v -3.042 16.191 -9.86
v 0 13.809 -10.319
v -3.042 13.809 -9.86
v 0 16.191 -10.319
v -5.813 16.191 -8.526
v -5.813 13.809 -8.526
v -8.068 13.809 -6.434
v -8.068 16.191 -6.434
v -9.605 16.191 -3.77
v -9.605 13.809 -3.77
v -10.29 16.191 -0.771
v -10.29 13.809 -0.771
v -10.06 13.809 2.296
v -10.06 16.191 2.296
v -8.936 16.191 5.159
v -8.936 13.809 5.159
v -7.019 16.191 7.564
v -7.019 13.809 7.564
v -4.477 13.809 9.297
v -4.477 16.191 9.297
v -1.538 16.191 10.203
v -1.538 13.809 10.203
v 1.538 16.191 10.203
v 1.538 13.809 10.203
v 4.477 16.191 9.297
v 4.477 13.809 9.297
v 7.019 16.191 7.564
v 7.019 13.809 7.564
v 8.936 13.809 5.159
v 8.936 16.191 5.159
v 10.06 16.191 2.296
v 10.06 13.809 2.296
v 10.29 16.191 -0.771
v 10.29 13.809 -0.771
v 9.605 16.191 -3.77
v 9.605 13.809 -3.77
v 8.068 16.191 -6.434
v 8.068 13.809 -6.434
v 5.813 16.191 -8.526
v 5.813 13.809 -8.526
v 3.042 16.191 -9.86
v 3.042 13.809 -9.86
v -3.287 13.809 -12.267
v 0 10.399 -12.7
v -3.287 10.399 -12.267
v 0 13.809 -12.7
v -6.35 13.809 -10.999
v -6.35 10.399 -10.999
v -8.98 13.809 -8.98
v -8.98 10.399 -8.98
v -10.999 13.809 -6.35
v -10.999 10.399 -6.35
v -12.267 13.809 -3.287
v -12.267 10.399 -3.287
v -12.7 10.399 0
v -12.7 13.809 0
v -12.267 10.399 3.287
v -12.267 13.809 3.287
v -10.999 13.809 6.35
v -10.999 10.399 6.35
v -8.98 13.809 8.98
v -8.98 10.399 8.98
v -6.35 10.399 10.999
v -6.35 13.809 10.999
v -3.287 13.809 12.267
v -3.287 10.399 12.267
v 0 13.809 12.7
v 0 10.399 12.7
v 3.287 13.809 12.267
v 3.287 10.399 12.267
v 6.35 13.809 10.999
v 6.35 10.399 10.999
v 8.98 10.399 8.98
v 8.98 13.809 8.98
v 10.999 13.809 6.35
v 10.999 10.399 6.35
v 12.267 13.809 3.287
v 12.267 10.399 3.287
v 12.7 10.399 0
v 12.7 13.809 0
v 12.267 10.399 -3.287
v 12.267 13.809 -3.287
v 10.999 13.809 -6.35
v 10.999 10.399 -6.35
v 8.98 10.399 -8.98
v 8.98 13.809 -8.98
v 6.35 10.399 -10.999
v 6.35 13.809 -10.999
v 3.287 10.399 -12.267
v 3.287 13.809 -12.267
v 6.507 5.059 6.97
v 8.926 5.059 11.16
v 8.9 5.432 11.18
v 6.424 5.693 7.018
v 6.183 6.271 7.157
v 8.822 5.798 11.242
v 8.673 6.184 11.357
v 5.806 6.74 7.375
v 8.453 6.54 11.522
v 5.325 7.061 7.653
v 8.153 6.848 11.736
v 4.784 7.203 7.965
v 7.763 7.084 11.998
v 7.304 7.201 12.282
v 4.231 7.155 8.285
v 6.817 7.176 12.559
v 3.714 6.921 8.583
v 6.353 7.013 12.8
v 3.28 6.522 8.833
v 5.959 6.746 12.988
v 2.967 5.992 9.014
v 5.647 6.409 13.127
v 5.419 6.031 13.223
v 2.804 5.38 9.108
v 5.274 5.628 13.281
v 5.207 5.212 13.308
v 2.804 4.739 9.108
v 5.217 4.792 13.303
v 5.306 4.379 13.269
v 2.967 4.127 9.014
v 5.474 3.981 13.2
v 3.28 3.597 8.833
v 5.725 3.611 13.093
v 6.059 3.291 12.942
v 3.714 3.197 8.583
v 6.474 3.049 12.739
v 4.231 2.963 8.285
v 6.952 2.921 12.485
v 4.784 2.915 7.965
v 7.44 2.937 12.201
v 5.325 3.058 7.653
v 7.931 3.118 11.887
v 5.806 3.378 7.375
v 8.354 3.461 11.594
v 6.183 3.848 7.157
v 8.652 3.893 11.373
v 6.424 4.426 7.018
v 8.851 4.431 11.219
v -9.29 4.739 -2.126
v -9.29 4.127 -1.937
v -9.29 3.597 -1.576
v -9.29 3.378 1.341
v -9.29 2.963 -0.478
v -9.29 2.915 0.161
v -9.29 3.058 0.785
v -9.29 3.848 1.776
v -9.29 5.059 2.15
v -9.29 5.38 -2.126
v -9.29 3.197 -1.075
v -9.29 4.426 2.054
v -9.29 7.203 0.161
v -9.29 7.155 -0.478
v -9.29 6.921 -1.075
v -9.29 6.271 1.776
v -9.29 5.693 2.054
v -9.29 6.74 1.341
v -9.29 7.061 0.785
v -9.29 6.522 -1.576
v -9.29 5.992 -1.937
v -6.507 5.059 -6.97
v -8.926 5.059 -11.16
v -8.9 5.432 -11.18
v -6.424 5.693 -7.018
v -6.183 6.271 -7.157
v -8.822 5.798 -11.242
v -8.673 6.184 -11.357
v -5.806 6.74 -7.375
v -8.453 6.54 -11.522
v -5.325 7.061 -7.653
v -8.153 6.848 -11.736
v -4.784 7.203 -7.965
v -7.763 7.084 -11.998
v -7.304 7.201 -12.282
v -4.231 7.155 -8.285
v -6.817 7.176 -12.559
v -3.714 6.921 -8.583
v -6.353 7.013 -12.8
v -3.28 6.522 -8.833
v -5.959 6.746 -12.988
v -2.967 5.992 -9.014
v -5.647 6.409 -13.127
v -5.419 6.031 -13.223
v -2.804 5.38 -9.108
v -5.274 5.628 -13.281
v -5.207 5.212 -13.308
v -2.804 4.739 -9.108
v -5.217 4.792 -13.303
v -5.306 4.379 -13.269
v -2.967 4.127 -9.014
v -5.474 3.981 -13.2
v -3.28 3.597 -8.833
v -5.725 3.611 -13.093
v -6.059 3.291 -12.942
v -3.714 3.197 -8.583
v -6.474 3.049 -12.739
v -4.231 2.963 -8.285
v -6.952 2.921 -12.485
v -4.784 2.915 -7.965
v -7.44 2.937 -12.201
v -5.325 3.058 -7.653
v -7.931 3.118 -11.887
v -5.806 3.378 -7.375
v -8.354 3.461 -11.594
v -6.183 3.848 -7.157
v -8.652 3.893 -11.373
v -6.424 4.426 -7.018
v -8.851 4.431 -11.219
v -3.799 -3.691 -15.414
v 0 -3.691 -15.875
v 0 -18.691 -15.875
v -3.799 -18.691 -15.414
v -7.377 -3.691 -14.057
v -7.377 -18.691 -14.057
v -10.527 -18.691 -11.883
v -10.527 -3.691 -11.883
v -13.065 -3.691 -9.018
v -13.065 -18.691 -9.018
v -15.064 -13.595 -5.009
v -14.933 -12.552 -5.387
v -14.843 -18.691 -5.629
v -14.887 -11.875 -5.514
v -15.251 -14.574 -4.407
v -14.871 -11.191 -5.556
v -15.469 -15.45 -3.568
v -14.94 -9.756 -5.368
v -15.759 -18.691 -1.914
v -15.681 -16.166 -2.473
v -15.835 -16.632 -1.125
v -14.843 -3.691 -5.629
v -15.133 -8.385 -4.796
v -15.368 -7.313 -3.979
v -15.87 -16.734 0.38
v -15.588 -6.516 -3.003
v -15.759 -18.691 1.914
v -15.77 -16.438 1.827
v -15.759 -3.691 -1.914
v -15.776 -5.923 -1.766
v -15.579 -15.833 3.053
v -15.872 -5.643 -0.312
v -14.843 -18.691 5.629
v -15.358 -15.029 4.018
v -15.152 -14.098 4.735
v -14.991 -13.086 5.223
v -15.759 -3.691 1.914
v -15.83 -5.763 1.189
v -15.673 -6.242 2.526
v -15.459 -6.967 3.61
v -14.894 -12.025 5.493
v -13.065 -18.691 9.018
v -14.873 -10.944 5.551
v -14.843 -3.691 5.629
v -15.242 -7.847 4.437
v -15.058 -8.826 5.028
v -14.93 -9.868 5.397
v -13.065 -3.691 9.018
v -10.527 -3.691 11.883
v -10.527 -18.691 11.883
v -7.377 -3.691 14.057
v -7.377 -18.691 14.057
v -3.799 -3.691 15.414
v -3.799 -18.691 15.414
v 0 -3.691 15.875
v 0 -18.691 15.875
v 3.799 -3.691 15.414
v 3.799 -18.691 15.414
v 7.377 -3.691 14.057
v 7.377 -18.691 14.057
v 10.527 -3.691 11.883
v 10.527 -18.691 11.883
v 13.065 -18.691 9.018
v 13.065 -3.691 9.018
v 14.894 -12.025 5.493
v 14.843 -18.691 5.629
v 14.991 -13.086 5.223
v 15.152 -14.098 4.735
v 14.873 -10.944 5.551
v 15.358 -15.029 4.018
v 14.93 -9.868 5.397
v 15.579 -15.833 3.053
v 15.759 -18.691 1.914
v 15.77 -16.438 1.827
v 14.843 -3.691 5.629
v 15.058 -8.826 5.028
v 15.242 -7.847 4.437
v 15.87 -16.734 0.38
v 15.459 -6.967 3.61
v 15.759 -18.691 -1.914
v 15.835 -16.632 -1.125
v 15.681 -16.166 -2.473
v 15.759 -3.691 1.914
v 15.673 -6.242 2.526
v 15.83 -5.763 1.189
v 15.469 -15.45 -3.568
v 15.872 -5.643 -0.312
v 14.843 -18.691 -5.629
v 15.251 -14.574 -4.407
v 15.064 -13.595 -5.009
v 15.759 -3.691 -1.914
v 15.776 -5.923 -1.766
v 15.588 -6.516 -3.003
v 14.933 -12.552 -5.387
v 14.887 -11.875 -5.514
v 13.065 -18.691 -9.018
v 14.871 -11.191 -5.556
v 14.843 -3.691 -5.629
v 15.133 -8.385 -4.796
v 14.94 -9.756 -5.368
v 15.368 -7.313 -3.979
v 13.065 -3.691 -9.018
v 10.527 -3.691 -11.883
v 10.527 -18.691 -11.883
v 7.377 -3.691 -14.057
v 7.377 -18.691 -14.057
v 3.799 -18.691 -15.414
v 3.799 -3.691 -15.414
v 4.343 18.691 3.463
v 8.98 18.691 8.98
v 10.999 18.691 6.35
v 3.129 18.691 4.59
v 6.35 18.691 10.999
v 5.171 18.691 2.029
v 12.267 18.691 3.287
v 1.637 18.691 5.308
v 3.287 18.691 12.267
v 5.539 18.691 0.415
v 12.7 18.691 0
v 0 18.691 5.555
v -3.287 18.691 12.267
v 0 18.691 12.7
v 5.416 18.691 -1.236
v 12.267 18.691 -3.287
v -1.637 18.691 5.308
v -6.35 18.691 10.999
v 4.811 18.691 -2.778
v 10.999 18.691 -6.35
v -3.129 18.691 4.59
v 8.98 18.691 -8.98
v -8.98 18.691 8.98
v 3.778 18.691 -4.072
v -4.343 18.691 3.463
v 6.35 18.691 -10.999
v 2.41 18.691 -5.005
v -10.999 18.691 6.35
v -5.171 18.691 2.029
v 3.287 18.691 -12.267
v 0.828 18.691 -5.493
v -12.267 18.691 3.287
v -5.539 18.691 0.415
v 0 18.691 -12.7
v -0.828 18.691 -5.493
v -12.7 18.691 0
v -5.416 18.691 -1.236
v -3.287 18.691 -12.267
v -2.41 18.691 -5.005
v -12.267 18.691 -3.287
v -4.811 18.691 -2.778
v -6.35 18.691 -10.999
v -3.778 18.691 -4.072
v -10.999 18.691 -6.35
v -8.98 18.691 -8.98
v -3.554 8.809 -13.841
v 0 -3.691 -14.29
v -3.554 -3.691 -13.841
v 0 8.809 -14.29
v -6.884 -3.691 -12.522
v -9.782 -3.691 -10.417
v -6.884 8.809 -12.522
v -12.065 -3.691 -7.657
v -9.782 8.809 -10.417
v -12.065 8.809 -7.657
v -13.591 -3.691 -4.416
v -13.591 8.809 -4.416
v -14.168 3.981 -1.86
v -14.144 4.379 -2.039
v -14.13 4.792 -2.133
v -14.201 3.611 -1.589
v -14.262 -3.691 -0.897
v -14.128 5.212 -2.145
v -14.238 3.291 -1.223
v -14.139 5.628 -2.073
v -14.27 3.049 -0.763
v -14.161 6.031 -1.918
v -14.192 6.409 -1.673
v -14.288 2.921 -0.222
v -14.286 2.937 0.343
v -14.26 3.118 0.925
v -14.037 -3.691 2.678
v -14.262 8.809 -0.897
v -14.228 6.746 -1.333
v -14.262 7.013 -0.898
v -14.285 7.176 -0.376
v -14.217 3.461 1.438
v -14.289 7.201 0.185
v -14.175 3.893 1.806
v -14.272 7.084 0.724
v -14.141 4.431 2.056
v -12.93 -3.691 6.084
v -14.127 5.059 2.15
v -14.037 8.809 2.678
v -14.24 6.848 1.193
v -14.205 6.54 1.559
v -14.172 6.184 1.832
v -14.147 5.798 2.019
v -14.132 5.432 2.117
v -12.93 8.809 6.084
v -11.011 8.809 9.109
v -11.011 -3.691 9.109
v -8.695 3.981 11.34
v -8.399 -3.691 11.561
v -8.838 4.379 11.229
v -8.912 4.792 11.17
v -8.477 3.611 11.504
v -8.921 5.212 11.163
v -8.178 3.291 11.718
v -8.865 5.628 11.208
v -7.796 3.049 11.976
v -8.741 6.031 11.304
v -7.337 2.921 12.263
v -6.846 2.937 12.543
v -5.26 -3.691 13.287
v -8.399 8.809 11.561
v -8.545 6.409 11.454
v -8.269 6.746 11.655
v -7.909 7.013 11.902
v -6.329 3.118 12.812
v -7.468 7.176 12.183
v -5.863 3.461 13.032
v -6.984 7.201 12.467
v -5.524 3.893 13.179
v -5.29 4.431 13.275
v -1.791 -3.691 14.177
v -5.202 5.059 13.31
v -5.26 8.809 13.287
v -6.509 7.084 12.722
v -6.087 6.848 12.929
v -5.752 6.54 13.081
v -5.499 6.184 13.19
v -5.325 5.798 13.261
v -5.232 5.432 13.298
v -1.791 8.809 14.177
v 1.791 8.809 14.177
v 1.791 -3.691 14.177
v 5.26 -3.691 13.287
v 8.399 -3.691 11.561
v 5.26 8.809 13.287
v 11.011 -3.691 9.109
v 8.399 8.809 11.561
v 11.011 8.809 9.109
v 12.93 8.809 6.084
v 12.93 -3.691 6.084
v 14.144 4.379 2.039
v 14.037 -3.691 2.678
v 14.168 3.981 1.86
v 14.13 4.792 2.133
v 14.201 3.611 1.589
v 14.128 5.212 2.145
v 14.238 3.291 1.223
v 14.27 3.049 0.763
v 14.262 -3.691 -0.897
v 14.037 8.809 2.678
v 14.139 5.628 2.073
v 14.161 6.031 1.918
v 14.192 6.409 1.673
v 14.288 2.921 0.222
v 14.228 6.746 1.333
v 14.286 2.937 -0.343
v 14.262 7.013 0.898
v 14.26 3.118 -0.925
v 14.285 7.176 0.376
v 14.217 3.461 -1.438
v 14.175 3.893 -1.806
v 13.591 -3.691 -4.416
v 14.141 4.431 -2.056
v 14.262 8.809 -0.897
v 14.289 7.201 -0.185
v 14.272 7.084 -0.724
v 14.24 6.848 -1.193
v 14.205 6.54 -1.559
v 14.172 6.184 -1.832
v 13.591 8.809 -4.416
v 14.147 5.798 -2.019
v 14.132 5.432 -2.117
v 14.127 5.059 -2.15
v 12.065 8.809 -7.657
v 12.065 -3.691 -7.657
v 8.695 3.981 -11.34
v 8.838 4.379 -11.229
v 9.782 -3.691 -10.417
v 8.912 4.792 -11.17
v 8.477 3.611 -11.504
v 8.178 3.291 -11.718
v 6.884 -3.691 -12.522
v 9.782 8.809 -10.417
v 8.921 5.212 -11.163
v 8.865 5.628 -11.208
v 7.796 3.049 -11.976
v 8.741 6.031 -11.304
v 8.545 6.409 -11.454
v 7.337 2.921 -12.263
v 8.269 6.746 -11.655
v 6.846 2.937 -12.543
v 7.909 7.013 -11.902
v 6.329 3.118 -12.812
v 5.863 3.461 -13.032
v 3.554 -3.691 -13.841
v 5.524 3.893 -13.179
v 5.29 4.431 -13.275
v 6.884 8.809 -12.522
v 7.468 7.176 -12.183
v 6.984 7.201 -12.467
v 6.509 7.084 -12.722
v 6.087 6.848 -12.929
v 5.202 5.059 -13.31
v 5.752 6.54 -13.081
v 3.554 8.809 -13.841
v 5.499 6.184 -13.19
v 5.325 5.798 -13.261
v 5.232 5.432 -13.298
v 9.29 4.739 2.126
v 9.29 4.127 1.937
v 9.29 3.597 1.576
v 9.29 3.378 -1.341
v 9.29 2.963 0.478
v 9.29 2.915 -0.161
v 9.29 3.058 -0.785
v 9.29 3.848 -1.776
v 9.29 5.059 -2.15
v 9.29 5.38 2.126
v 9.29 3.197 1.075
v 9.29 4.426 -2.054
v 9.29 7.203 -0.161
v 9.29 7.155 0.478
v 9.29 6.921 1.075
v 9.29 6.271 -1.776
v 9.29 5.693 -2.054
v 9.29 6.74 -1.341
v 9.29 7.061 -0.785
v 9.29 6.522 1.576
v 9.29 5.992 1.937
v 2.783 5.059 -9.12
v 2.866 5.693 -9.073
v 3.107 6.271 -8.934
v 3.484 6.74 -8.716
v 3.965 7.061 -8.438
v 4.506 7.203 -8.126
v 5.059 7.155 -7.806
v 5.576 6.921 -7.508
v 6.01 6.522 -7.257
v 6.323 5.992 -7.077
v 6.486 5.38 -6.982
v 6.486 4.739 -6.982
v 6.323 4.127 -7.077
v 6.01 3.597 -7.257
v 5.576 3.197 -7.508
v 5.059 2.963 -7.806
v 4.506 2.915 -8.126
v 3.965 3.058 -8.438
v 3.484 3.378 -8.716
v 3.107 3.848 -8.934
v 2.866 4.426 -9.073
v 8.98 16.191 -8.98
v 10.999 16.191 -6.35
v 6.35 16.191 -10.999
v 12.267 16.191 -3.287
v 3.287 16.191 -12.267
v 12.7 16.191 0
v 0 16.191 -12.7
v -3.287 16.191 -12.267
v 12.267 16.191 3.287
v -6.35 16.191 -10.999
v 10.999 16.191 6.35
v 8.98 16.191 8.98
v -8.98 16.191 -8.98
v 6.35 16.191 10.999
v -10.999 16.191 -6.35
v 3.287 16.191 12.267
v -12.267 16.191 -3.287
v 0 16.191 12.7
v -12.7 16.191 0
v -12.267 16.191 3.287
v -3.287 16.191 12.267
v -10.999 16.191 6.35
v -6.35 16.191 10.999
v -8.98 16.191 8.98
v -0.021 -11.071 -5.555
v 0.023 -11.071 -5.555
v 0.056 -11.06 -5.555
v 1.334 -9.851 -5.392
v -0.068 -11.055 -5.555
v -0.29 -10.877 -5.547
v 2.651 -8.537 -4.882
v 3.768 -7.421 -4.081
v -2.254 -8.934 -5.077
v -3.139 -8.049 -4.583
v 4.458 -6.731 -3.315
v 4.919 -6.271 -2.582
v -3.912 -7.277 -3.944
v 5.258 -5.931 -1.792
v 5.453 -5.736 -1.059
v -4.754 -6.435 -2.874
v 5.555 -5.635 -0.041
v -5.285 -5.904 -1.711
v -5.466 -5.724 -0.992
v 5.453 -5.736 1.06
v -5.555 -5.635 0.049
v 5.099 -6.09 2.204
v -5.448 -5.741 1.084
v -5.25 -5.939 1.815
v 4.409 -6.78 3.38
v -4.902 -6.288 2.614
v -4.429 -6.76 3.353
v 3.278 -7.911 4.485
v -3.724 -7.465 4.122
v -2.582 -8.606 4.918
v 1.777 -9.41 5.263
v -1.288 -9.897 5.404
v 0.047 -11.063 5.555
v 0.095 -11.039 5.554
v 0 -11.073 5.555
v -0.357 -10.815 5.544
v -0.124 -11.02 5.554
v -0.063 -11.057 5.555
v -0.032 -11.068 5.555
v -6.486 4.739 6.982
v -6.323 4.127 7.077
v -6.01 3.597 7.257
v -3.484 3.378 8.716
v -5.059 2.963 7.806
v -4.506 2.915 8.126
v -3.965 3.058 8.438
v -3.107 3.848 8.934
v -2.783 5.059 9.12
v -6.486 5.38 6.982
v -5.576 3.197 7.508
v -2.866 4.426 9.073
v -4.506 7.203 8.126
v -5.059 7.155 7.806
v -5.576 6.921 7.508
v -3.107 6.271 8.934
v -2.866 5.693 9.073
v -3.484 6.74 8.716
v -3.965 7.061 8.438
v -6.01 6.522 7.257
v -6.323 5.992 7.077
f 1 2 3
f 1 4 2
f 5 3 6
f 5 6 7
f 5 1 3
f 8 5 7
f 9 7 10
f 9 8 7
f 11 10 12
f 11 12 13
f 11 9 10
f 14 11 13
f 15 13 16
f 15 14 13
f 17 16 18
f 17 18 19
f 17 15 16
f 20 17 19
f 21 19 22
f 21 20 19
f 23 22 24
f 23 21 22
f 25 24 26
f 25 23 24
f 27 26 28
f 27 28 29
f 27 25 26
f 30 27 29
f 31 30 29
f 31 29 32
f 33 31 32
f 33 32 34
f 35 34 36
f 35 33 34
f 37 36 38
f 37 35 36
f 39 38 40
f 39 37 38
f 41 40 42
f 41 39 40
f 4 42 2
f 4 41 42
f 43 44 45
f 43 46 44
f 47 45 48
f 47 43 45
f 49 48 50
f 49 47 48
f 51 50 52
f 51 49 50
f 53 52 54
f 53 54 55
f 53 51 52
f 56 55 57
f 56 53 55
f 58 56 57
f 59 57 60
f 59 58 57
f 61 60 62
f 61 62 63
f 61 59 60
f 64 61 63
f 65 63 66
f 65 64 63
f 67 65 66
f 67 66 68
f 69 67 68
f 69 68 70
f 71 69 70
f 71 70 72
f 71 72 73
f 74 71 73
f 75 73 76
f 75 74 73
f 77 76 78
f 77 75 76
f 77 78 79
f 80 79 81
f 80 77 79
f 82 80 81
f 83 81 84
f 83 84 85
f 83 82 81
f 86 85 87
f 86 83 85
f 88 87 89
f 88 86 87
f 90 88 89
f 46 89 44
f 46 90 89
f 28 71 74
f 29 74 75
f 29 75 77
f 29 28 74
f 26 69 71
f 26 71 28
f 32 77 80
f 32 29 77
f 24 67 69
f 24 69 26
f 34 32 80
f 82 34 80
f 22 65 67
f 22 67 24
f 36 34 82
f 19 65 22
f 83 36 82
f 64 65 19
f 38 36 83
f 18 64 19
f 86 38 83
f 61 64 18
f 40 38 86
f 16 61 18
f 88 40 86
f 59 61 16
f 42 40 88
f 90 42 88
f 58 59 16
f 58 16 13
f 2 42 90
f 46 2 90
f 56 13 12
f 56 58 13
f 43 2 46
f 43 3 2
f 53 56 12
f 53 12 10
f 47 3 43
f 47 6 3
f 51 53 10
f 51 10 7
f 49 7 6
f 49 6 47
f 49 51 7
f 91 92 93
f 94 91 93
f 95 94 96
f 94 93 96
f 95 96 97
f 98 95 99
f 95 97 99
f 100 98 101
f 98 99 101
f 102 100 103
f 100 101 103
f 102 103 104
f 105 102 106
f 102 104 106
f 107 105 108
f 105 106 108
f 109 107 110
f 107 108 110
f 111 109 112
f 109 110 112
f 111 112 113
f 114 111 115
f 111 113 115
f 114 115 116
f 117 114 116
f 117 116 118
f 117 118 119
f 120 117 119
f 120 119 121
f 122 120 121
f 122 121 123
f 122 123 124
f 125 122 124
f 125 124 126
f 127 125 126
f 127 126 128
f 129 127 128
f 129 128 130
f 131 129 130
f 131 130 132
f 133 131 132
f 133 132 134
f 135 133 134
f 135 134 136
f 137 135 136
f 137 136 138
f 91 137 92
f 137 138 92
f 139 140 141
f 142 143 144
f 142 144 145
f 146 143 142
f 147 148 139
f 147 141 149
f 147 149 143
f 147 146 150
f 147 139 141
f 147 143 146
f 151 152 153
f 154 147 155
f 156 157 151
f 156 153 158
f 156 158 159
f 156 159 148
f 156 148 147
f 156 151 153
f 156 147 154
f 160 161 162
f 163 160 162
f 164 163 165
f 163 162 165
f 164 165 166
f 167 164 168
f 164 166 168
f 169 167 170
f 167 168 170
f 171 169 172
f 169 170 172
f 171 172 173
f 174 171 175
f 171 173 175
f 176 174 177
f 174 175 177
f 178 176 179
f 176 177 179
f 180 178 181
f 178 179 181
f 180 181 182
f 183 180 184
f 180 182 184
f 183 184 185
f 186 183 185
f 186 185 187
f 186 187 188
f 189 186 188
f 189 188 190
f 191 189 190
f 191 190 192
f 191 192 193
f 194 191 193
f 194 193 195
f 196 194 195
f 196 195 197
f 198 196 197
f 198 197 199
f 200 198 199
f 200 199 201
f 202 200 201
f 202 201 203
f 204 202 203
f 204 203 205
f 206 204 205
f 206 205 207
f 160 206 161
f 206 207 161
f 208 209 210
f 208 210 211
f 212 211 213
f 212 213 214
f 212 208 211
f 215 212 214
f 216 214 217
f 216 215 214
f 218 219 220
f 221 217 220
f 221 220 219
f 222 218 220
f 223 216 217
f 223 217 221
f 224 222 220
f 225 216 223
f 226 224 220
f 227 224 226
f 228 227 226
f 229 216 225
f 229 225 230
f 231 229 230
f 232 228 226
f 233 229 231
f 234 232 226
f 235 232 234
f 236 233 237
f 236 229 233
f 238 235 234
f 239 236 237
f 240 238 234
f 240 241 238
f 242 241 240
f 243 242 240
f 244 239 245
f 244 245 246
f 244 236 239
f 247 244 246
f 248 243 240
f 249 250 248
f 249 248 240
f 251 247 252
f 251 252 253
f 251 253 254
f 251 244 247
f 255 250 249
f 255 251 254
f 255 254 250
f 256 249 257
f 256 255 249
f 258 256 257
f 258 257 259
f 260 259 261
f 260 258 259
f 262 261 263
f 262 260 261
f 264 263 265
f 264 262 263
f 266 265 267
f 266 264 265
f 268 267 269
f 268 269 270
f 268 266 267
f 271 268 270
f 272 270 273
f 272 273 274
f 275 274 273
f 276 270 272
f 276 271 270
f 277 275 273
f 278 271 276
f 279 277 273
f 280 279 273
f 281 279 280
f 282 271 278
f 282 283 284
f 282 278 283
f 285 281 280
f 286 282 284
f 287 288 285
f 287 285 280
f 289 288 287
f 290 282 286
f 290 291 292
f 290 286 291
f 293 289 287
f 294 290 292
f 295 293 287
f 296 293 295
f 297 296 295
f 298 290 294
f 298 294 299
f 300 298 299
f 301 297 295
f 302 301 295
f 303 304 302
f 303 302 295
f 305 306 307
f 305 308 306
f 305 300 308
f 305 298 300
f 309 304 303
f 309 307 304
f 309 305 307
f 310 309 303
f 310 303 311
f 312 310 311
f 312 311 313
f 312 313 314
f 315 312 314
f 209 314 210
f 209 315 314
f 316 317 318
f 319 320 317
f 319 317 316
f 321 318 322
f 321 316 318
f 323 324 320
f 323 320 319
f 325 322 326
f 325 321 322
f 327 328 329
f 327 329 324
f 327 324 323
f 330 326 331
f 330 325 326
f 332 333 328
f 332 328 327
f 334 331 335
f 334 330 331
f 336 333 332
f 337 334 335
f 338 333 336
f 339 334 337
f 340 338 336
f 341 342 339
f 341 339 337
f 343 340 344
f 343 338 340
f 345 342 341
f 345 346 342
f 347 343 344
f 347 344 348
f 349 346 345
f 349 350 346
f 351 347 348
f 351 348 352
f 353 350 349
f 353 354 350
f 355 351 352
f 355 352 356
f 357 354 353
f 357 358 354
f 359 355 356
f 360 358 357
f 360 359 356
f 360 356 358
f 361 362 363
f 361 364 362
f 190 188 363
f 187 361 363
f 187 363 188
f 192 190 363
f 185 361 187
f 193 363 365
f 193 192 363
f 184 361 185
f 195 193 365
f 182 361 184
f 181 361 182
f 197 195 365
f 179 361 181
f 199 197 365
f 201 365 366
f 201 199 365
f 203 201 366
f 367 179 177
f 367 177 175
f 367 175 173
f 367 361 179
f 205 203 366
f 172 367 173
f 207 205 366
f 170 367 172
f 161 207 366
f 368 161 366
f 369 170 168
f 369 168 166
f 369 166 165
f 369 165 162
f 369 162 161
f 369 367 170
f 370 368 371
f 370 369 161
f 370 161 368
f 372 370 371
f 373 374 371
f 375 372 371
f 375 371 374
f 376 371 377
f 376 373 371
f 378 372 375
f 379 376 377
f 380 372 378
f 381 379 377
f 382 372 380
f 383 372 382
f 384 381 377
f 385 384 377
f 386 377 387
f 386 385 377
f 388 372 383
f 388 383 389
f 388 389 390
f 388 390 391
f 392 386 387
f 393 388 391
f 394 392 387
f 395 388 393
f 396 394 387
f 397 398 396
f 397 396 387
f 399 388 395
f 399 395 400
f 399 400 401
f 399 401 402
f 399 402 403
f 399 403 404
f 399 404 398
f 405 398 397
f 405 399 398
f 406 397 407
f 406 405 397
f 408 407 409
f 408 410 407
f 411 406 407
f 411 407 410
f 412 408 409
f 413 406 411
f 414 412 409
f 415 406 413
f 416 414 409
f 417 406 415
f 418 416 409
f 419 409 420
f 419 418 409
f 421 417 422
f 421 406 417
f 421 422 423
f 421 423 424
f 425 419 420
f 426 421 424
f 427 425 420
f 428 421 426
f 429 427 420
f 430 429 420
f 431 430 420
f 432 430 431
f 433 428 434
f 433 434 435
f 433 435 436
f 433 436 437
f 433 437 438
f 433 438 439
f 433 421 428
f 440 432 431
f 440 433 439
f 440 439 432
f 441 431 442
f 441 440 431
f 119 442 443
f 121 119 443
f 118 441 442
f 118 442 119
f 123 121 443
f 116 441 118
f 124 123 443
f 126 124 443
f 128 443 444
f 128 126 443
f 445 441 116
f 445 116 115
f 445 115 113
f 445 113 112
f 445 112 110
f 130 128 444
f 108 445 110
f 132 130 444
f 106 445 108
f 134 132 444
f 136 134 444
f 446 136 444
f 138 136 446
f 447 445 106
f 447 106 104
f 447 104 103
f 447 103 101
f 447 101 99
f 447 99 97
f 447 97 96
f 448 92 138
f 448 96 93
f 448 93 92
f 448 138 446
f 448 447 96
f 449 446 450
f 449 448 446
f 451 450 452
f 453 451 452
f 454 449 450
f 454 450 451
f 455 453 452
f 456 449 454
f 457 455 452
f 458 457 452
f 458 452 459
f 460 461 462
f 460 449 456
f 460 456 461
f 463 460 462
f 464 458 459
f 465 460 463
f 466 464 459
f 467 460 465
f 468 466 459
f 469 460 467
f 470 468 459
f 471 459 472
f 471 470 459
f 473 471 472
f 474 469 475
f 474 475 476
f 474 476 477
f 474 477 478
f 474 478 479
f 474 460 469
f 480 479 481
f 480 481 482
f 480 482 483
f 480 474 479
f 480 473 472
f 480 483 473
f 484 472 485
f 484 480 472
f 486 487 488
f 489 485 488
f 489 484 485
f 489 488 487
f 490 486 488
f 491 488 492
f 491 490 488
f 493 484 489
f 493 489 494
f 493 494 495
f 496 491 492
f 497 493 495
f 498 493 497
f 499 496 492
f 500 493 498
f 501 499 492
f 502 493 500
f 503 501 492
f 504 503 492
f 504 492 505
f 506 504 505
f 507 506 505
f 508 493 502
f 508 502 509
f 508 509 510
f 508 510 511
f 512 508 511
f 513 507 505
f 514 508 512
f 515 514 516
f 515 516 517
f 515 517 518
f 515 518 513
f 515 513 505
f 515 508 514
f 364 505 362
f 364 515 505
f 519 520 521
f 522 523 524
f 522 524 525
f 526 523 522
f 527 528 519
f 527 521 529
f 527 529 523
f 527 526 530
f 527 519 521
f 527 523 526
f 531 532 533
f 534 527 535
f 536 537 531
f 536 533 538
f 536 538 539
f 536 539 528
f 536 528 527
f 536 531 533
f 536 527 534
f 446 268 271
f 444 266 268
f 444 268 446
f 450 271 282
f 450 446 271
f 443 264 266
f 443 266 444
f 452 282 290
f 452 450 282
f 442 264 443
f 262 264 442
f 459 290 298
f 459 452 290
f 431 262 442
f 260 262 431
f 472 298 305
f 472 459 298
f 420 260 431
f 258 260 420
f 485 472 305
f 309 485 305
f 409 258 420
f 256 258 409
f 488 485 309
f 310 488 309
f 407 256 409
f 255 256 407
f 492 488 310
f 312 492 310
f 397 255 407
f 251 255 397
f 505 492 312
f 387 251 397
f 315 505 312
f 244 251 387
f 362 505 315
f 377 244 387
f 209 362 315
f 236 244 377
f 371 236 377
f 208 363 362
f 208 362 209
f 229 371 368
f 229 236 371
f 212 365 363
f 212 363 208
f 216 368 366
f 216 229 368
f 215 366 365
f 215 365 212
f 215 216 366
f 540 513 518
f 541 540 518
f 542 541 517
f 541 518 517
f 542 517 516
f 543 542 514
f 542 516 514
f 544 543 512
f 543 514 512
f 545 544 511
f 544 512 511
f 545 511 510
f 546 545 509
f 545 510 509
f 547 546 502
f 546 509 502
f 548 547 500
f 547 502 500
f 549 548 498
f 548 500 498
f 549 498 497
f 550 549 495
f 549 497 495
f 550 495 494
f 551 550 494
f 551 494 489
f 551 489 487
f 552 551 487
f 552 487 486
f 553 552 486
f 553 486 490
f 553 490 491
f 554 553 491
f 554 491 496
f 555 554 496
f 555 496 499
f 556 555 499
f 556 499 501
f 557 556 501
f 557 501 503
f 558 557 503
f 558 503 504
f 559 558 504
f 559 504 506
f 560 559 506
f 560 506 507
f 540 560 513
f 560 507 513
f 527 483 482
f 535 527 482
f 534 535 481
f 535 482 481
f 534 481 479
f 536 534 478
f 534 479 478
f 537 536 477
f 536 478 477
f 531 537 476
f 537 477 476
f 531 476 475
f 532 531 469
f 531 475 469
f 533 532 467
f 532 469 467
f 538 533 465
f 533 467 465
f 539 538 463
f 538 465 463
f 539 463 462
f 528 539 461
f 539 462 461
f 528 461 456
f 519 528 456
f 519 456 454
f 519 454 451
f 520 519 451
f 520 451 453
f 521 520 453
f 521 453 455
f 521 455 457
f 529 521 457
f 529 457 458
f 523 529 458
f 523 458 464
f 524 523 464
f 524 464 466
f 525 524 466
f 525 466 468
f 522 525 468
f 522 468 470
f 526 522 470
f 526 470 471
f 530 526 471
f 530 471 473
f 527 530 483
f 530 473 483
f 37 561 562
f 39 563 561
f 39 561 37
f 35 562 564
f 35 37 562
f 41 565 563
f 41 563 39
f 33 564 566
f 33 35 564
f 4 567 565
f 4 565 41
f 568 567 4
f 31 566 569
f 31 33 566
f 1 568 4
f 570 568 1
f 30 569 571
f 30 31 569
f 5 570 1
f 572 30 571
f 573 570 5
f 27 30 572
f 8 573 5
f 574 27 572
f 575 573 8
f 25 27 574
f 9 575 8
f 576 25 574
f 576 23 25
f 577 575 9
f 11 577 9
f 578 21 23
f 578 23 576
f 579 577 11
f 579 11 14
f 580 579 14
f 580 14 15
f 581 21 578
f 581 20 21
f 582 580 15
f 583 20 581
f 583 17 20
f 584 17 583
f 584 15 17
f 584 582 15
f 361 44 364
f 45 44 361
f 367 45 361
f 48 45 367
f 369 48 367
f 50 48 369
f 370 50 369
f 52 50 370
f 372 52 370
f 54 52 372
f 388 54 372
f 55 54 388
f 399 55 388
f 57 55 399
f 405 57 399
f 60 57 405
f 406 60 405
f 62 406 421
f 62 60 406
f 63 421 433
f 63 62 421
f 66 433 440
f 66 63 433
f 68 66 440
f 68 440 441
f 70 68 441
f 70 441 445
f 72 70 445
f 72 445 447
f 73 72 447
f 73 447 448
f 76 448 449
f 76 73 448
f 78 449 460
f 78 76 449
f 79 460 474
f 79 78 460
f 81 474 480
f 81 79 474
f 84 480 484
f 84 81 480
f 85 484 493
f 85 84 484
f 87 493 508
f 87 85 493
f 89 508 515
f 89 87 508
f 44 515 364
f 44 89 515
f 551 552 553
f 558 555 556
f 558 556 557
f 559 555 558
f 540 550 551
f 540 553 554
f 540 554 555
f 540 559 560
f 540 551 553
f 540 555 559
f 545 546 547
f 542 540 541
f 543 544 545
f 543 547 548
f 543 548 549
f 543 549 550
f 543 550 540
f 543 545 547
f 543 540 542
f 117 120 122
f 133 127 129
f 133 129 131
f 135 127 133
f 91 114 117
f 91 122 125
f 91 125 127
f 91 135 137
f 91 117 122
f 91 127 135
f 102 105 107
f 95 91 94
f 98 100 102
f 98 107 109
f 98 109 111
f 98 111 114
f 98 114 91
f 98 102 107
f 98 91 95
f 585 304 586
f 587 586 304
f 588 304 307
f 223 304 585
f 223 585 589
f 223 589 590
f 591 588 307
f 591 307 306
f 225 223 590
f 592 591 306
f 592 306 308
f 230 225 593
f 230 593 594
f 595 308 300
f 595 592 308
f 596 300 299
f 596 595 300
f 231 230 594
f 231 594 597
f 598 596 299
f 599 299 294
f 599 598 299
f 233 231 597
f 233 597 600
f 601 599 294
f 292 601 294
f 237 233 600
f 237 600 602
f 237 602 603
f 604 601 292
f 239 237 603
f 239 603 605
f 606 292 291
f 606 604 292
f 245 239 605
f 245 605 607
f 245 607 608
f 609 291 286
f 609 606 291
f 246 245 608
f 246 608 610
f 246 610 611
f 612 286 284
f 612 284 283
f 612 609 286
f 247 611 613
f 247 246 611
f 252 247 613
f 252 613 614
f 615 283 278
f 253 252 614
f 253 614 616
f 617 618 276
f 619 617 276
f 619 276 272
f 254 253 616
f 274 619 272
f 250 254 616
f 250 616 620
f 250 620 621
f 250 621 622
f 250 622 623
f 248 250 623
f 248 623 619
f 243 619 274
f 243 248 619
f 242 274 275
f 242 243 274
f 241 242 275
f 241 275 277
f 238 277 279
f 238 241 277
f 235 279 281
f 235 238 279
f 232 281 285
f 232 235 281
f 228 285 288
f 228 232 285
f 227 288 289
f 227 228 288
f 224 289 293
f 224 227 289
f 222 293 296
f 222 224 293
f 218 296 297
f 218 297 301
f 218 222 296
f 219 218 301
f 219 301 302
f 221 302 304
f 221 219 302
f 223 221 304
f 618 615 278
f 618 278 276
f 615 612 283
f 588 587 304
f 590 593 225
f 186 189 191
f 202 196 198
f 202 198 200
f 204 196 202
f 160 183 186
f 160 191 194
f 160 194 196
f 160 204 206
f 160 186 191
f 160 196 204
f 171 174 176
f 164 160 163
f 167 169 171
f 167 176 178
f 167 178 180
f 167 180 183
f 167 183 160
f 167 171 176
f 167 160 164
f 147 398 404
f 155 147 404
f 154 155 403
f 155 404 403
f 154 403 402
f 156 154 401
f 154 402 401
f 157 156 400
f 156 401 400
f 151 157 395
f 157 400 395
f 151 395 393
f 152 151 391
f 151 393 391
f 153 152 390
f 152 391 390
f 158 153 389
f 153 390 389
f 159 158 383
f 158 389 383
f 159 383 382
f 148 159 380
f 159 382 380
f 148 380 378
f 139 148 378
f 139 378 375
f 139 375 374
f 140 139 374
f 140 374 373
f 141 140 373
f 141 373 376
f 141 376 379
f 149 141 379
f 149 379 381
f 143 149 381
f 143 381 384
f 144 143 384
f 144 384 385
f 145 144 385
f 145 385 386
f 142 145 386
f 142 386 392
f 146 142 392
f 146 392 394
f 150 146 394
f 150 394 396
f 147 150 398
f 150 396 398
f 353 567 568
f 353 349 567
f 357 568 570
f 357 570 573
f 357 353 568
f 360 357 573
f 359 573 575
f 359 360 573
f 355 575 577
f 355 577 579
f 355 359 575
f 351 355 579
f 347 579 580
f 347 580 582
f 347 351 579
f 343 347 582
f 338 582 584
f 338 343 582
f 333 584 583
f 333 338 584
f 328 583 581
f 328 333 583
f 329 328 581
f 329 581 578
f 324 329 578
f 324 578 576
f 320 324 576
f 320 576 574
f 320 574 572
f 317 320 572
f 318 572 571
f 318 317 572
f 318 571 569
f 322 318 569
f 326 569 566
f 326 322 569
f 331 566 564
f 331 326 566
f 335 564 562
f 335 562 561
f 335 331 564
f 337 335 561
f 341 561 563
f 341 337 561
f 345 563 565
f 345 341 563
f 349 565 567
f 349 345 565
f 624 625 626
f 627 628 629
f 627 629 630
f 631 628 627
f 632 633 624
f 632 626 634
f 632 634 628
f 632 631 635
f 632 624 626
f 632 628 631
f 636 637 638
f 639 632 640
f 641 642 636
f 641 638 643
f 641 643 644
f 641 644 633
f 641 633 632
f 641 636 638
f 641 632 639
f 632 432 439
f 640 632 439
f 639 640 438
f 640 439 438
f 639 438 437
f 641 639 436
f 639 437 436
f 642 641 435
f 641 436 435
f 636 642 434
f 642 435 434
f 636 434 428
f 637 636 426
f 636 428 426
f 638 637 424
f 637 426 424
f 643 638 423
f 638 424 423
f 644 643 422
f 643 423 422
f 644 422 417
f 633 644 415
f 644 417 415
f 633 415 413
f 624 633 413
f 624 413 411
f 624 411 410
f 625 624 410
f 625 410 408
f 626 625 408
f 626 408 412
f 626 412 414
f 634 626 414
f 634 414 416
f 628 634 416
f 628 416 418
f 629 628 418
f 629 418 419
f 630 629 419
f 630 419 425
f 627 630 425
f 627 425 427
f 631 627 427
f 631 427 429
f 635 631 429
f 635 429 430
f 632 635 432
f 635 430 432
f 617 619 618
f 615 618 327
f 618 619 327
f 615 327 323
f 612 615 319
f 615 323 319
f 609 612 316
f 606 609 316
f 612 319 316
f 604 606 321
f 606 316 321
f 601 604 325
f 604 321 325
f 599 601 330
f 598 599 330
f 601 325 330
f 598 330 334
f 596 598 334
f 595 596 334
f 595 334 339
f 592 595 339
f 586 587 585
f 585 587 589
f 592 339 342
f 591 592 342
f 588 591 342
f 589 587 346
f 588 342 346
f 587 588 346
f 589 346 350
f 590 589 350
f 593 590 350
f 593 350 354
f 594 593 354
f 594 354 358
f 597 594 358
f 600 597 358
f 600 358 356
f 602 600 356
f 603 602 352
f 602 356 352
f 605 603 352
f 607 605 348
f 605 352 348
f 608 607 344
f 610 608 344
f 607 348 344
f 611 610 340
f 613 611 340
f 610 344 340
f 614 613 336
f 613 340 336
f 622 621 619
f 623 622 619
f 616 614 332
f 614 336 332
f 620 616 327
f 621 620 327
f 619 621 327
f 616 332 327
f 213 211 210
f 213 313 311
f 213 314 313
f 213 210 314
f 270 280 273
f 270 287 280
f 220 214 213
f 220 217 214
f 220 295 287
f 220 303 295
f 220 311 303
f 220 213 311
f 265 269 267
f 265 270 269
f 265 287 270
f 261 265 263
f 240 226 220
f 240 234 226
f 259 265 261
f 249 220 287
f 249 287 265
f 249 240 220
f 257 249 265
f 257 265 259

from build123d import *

# Parameters (mm, degrees)
CUT_EXTRUDE1_DEPTH      = 30.212509527
CUT_EXTRUDE1_DEPTH_BACK = 30.212509527
SKETCH2_R               = 5.55625
SKETCH4_R               = 2.15
CUT_EXTRUDE3_DEPTH      = 5
CIRPATTERN1_COUNT       = 6
CUT_EXTRUDE4_REACH      = 45.605
CUT_EXTRUDE4_END_RADIUS = 5.55625
SKETCH6_R               = 5.555


with BuildPart() as part:
    # Sketch1 → Revolve1 (revolve)
    with BuildSketch(Plane.XY, mode=Mode.PRIVATE) as revolve1_sk:
        Polygon((0, -18.690625), (15.875, -18.690625), (15.875, -3.690625), (14.29, -3.690625), (14.29, 8.809375), (12.7, 10.399375), (12.7, 13.809375), (10.31875, 13.809375), (10.31875, 16.190625), (12.7, 16.190625), (12.7, 18.690625), (0, 18.690625), align=None)
    revolve(revolve1_sk.sketch.rotate(Axis((0, -8.095014715, 0), (0, 1, 0)), 90), axis=Axis((0, -8.095014715, 0), (0, 1, 0)))

    # Sketch2 → Cut-Extrude1 (cut, two sides: drawn at the far end of the back side and taken through both)
    with BuildSketch(Plane(origin=(0, 0, 0), x_dir=(0, 0, -1), z_dir=(1, 0, 0)).offset(-CUT_EXTRUDE1_DEPTH_BACK)):
        with Locations((0, -11.190625)):
            Circle(SKETCH2_R)
    extrude(amount=CUT_EXTRUDE1_DEPTH + CUT_EXTRUDE1_DEPTH_BACK, mode=Mode.SUBTRACT)

    # Sketch4 → Cut-Extrude3 (cut)
    with BuildSketch(Plane(origin=(14.29, 0, 0), x_dir=(0, 0, -1), z_dir=(1, 0, 0))):
        with Locations((0, 5.059375)):
            Circle(SKETCH4_R)
    cut_extrude3 = extrude(amount=-CUT_EXTRUDE3_DEPTH, mode=Mode.SUBTRACT)

    # CirPattern1: Cut-Extrude3 ×6 about axis
    cirpattern1_axis = Axis((0, 0, 0), (0, 1, 0))
    for i in range(1, CIRPATTERN1_COUNT):
        add(cut_extrude3.rotate(cirpattern1_axis, i * 360 / CIRPATTERN1_COUNT), mode=Mode.SUBTRACT)

    # Cut-Extrude4: up to this cylinder (the profile starts outside it)
    cut_extrude4_end = Plane(origin=(0, -11.190625, 0), z_dir=(1, 0, 0)) * Cylinder(CUT_EXTRUDE4_END_RADIUS, 103.3225, mode=Mode.PRIVATE)
    # Sketch6 → Cut-Extrude4 (cut, up to the surface)
    with BuildSketch(Plane(origin=(0, 18.690625, 0), x_dir=(1, 0, 0), z_dir=(0, 1, 0)), mode=Mode.PRIVATE) as cut_extrude4_sk1:
        with Locations(Location((0, 0, 0), (0, 0, 270))):
            Circle(SKETCH6_R)
    cut_extrude4_tool1 = extrude(cut_extrude4_sk1.sketch, amount=-CUT_EXTRUDE4_REACH, mode=Mode.PRIVATE) - cut_extrude4_end
    add(cut_extrude4_tool1.solids().sort_by_distance((0, 18.690625, 0))[0], mode=Mode.SUBTRACT)


solid = part.part
